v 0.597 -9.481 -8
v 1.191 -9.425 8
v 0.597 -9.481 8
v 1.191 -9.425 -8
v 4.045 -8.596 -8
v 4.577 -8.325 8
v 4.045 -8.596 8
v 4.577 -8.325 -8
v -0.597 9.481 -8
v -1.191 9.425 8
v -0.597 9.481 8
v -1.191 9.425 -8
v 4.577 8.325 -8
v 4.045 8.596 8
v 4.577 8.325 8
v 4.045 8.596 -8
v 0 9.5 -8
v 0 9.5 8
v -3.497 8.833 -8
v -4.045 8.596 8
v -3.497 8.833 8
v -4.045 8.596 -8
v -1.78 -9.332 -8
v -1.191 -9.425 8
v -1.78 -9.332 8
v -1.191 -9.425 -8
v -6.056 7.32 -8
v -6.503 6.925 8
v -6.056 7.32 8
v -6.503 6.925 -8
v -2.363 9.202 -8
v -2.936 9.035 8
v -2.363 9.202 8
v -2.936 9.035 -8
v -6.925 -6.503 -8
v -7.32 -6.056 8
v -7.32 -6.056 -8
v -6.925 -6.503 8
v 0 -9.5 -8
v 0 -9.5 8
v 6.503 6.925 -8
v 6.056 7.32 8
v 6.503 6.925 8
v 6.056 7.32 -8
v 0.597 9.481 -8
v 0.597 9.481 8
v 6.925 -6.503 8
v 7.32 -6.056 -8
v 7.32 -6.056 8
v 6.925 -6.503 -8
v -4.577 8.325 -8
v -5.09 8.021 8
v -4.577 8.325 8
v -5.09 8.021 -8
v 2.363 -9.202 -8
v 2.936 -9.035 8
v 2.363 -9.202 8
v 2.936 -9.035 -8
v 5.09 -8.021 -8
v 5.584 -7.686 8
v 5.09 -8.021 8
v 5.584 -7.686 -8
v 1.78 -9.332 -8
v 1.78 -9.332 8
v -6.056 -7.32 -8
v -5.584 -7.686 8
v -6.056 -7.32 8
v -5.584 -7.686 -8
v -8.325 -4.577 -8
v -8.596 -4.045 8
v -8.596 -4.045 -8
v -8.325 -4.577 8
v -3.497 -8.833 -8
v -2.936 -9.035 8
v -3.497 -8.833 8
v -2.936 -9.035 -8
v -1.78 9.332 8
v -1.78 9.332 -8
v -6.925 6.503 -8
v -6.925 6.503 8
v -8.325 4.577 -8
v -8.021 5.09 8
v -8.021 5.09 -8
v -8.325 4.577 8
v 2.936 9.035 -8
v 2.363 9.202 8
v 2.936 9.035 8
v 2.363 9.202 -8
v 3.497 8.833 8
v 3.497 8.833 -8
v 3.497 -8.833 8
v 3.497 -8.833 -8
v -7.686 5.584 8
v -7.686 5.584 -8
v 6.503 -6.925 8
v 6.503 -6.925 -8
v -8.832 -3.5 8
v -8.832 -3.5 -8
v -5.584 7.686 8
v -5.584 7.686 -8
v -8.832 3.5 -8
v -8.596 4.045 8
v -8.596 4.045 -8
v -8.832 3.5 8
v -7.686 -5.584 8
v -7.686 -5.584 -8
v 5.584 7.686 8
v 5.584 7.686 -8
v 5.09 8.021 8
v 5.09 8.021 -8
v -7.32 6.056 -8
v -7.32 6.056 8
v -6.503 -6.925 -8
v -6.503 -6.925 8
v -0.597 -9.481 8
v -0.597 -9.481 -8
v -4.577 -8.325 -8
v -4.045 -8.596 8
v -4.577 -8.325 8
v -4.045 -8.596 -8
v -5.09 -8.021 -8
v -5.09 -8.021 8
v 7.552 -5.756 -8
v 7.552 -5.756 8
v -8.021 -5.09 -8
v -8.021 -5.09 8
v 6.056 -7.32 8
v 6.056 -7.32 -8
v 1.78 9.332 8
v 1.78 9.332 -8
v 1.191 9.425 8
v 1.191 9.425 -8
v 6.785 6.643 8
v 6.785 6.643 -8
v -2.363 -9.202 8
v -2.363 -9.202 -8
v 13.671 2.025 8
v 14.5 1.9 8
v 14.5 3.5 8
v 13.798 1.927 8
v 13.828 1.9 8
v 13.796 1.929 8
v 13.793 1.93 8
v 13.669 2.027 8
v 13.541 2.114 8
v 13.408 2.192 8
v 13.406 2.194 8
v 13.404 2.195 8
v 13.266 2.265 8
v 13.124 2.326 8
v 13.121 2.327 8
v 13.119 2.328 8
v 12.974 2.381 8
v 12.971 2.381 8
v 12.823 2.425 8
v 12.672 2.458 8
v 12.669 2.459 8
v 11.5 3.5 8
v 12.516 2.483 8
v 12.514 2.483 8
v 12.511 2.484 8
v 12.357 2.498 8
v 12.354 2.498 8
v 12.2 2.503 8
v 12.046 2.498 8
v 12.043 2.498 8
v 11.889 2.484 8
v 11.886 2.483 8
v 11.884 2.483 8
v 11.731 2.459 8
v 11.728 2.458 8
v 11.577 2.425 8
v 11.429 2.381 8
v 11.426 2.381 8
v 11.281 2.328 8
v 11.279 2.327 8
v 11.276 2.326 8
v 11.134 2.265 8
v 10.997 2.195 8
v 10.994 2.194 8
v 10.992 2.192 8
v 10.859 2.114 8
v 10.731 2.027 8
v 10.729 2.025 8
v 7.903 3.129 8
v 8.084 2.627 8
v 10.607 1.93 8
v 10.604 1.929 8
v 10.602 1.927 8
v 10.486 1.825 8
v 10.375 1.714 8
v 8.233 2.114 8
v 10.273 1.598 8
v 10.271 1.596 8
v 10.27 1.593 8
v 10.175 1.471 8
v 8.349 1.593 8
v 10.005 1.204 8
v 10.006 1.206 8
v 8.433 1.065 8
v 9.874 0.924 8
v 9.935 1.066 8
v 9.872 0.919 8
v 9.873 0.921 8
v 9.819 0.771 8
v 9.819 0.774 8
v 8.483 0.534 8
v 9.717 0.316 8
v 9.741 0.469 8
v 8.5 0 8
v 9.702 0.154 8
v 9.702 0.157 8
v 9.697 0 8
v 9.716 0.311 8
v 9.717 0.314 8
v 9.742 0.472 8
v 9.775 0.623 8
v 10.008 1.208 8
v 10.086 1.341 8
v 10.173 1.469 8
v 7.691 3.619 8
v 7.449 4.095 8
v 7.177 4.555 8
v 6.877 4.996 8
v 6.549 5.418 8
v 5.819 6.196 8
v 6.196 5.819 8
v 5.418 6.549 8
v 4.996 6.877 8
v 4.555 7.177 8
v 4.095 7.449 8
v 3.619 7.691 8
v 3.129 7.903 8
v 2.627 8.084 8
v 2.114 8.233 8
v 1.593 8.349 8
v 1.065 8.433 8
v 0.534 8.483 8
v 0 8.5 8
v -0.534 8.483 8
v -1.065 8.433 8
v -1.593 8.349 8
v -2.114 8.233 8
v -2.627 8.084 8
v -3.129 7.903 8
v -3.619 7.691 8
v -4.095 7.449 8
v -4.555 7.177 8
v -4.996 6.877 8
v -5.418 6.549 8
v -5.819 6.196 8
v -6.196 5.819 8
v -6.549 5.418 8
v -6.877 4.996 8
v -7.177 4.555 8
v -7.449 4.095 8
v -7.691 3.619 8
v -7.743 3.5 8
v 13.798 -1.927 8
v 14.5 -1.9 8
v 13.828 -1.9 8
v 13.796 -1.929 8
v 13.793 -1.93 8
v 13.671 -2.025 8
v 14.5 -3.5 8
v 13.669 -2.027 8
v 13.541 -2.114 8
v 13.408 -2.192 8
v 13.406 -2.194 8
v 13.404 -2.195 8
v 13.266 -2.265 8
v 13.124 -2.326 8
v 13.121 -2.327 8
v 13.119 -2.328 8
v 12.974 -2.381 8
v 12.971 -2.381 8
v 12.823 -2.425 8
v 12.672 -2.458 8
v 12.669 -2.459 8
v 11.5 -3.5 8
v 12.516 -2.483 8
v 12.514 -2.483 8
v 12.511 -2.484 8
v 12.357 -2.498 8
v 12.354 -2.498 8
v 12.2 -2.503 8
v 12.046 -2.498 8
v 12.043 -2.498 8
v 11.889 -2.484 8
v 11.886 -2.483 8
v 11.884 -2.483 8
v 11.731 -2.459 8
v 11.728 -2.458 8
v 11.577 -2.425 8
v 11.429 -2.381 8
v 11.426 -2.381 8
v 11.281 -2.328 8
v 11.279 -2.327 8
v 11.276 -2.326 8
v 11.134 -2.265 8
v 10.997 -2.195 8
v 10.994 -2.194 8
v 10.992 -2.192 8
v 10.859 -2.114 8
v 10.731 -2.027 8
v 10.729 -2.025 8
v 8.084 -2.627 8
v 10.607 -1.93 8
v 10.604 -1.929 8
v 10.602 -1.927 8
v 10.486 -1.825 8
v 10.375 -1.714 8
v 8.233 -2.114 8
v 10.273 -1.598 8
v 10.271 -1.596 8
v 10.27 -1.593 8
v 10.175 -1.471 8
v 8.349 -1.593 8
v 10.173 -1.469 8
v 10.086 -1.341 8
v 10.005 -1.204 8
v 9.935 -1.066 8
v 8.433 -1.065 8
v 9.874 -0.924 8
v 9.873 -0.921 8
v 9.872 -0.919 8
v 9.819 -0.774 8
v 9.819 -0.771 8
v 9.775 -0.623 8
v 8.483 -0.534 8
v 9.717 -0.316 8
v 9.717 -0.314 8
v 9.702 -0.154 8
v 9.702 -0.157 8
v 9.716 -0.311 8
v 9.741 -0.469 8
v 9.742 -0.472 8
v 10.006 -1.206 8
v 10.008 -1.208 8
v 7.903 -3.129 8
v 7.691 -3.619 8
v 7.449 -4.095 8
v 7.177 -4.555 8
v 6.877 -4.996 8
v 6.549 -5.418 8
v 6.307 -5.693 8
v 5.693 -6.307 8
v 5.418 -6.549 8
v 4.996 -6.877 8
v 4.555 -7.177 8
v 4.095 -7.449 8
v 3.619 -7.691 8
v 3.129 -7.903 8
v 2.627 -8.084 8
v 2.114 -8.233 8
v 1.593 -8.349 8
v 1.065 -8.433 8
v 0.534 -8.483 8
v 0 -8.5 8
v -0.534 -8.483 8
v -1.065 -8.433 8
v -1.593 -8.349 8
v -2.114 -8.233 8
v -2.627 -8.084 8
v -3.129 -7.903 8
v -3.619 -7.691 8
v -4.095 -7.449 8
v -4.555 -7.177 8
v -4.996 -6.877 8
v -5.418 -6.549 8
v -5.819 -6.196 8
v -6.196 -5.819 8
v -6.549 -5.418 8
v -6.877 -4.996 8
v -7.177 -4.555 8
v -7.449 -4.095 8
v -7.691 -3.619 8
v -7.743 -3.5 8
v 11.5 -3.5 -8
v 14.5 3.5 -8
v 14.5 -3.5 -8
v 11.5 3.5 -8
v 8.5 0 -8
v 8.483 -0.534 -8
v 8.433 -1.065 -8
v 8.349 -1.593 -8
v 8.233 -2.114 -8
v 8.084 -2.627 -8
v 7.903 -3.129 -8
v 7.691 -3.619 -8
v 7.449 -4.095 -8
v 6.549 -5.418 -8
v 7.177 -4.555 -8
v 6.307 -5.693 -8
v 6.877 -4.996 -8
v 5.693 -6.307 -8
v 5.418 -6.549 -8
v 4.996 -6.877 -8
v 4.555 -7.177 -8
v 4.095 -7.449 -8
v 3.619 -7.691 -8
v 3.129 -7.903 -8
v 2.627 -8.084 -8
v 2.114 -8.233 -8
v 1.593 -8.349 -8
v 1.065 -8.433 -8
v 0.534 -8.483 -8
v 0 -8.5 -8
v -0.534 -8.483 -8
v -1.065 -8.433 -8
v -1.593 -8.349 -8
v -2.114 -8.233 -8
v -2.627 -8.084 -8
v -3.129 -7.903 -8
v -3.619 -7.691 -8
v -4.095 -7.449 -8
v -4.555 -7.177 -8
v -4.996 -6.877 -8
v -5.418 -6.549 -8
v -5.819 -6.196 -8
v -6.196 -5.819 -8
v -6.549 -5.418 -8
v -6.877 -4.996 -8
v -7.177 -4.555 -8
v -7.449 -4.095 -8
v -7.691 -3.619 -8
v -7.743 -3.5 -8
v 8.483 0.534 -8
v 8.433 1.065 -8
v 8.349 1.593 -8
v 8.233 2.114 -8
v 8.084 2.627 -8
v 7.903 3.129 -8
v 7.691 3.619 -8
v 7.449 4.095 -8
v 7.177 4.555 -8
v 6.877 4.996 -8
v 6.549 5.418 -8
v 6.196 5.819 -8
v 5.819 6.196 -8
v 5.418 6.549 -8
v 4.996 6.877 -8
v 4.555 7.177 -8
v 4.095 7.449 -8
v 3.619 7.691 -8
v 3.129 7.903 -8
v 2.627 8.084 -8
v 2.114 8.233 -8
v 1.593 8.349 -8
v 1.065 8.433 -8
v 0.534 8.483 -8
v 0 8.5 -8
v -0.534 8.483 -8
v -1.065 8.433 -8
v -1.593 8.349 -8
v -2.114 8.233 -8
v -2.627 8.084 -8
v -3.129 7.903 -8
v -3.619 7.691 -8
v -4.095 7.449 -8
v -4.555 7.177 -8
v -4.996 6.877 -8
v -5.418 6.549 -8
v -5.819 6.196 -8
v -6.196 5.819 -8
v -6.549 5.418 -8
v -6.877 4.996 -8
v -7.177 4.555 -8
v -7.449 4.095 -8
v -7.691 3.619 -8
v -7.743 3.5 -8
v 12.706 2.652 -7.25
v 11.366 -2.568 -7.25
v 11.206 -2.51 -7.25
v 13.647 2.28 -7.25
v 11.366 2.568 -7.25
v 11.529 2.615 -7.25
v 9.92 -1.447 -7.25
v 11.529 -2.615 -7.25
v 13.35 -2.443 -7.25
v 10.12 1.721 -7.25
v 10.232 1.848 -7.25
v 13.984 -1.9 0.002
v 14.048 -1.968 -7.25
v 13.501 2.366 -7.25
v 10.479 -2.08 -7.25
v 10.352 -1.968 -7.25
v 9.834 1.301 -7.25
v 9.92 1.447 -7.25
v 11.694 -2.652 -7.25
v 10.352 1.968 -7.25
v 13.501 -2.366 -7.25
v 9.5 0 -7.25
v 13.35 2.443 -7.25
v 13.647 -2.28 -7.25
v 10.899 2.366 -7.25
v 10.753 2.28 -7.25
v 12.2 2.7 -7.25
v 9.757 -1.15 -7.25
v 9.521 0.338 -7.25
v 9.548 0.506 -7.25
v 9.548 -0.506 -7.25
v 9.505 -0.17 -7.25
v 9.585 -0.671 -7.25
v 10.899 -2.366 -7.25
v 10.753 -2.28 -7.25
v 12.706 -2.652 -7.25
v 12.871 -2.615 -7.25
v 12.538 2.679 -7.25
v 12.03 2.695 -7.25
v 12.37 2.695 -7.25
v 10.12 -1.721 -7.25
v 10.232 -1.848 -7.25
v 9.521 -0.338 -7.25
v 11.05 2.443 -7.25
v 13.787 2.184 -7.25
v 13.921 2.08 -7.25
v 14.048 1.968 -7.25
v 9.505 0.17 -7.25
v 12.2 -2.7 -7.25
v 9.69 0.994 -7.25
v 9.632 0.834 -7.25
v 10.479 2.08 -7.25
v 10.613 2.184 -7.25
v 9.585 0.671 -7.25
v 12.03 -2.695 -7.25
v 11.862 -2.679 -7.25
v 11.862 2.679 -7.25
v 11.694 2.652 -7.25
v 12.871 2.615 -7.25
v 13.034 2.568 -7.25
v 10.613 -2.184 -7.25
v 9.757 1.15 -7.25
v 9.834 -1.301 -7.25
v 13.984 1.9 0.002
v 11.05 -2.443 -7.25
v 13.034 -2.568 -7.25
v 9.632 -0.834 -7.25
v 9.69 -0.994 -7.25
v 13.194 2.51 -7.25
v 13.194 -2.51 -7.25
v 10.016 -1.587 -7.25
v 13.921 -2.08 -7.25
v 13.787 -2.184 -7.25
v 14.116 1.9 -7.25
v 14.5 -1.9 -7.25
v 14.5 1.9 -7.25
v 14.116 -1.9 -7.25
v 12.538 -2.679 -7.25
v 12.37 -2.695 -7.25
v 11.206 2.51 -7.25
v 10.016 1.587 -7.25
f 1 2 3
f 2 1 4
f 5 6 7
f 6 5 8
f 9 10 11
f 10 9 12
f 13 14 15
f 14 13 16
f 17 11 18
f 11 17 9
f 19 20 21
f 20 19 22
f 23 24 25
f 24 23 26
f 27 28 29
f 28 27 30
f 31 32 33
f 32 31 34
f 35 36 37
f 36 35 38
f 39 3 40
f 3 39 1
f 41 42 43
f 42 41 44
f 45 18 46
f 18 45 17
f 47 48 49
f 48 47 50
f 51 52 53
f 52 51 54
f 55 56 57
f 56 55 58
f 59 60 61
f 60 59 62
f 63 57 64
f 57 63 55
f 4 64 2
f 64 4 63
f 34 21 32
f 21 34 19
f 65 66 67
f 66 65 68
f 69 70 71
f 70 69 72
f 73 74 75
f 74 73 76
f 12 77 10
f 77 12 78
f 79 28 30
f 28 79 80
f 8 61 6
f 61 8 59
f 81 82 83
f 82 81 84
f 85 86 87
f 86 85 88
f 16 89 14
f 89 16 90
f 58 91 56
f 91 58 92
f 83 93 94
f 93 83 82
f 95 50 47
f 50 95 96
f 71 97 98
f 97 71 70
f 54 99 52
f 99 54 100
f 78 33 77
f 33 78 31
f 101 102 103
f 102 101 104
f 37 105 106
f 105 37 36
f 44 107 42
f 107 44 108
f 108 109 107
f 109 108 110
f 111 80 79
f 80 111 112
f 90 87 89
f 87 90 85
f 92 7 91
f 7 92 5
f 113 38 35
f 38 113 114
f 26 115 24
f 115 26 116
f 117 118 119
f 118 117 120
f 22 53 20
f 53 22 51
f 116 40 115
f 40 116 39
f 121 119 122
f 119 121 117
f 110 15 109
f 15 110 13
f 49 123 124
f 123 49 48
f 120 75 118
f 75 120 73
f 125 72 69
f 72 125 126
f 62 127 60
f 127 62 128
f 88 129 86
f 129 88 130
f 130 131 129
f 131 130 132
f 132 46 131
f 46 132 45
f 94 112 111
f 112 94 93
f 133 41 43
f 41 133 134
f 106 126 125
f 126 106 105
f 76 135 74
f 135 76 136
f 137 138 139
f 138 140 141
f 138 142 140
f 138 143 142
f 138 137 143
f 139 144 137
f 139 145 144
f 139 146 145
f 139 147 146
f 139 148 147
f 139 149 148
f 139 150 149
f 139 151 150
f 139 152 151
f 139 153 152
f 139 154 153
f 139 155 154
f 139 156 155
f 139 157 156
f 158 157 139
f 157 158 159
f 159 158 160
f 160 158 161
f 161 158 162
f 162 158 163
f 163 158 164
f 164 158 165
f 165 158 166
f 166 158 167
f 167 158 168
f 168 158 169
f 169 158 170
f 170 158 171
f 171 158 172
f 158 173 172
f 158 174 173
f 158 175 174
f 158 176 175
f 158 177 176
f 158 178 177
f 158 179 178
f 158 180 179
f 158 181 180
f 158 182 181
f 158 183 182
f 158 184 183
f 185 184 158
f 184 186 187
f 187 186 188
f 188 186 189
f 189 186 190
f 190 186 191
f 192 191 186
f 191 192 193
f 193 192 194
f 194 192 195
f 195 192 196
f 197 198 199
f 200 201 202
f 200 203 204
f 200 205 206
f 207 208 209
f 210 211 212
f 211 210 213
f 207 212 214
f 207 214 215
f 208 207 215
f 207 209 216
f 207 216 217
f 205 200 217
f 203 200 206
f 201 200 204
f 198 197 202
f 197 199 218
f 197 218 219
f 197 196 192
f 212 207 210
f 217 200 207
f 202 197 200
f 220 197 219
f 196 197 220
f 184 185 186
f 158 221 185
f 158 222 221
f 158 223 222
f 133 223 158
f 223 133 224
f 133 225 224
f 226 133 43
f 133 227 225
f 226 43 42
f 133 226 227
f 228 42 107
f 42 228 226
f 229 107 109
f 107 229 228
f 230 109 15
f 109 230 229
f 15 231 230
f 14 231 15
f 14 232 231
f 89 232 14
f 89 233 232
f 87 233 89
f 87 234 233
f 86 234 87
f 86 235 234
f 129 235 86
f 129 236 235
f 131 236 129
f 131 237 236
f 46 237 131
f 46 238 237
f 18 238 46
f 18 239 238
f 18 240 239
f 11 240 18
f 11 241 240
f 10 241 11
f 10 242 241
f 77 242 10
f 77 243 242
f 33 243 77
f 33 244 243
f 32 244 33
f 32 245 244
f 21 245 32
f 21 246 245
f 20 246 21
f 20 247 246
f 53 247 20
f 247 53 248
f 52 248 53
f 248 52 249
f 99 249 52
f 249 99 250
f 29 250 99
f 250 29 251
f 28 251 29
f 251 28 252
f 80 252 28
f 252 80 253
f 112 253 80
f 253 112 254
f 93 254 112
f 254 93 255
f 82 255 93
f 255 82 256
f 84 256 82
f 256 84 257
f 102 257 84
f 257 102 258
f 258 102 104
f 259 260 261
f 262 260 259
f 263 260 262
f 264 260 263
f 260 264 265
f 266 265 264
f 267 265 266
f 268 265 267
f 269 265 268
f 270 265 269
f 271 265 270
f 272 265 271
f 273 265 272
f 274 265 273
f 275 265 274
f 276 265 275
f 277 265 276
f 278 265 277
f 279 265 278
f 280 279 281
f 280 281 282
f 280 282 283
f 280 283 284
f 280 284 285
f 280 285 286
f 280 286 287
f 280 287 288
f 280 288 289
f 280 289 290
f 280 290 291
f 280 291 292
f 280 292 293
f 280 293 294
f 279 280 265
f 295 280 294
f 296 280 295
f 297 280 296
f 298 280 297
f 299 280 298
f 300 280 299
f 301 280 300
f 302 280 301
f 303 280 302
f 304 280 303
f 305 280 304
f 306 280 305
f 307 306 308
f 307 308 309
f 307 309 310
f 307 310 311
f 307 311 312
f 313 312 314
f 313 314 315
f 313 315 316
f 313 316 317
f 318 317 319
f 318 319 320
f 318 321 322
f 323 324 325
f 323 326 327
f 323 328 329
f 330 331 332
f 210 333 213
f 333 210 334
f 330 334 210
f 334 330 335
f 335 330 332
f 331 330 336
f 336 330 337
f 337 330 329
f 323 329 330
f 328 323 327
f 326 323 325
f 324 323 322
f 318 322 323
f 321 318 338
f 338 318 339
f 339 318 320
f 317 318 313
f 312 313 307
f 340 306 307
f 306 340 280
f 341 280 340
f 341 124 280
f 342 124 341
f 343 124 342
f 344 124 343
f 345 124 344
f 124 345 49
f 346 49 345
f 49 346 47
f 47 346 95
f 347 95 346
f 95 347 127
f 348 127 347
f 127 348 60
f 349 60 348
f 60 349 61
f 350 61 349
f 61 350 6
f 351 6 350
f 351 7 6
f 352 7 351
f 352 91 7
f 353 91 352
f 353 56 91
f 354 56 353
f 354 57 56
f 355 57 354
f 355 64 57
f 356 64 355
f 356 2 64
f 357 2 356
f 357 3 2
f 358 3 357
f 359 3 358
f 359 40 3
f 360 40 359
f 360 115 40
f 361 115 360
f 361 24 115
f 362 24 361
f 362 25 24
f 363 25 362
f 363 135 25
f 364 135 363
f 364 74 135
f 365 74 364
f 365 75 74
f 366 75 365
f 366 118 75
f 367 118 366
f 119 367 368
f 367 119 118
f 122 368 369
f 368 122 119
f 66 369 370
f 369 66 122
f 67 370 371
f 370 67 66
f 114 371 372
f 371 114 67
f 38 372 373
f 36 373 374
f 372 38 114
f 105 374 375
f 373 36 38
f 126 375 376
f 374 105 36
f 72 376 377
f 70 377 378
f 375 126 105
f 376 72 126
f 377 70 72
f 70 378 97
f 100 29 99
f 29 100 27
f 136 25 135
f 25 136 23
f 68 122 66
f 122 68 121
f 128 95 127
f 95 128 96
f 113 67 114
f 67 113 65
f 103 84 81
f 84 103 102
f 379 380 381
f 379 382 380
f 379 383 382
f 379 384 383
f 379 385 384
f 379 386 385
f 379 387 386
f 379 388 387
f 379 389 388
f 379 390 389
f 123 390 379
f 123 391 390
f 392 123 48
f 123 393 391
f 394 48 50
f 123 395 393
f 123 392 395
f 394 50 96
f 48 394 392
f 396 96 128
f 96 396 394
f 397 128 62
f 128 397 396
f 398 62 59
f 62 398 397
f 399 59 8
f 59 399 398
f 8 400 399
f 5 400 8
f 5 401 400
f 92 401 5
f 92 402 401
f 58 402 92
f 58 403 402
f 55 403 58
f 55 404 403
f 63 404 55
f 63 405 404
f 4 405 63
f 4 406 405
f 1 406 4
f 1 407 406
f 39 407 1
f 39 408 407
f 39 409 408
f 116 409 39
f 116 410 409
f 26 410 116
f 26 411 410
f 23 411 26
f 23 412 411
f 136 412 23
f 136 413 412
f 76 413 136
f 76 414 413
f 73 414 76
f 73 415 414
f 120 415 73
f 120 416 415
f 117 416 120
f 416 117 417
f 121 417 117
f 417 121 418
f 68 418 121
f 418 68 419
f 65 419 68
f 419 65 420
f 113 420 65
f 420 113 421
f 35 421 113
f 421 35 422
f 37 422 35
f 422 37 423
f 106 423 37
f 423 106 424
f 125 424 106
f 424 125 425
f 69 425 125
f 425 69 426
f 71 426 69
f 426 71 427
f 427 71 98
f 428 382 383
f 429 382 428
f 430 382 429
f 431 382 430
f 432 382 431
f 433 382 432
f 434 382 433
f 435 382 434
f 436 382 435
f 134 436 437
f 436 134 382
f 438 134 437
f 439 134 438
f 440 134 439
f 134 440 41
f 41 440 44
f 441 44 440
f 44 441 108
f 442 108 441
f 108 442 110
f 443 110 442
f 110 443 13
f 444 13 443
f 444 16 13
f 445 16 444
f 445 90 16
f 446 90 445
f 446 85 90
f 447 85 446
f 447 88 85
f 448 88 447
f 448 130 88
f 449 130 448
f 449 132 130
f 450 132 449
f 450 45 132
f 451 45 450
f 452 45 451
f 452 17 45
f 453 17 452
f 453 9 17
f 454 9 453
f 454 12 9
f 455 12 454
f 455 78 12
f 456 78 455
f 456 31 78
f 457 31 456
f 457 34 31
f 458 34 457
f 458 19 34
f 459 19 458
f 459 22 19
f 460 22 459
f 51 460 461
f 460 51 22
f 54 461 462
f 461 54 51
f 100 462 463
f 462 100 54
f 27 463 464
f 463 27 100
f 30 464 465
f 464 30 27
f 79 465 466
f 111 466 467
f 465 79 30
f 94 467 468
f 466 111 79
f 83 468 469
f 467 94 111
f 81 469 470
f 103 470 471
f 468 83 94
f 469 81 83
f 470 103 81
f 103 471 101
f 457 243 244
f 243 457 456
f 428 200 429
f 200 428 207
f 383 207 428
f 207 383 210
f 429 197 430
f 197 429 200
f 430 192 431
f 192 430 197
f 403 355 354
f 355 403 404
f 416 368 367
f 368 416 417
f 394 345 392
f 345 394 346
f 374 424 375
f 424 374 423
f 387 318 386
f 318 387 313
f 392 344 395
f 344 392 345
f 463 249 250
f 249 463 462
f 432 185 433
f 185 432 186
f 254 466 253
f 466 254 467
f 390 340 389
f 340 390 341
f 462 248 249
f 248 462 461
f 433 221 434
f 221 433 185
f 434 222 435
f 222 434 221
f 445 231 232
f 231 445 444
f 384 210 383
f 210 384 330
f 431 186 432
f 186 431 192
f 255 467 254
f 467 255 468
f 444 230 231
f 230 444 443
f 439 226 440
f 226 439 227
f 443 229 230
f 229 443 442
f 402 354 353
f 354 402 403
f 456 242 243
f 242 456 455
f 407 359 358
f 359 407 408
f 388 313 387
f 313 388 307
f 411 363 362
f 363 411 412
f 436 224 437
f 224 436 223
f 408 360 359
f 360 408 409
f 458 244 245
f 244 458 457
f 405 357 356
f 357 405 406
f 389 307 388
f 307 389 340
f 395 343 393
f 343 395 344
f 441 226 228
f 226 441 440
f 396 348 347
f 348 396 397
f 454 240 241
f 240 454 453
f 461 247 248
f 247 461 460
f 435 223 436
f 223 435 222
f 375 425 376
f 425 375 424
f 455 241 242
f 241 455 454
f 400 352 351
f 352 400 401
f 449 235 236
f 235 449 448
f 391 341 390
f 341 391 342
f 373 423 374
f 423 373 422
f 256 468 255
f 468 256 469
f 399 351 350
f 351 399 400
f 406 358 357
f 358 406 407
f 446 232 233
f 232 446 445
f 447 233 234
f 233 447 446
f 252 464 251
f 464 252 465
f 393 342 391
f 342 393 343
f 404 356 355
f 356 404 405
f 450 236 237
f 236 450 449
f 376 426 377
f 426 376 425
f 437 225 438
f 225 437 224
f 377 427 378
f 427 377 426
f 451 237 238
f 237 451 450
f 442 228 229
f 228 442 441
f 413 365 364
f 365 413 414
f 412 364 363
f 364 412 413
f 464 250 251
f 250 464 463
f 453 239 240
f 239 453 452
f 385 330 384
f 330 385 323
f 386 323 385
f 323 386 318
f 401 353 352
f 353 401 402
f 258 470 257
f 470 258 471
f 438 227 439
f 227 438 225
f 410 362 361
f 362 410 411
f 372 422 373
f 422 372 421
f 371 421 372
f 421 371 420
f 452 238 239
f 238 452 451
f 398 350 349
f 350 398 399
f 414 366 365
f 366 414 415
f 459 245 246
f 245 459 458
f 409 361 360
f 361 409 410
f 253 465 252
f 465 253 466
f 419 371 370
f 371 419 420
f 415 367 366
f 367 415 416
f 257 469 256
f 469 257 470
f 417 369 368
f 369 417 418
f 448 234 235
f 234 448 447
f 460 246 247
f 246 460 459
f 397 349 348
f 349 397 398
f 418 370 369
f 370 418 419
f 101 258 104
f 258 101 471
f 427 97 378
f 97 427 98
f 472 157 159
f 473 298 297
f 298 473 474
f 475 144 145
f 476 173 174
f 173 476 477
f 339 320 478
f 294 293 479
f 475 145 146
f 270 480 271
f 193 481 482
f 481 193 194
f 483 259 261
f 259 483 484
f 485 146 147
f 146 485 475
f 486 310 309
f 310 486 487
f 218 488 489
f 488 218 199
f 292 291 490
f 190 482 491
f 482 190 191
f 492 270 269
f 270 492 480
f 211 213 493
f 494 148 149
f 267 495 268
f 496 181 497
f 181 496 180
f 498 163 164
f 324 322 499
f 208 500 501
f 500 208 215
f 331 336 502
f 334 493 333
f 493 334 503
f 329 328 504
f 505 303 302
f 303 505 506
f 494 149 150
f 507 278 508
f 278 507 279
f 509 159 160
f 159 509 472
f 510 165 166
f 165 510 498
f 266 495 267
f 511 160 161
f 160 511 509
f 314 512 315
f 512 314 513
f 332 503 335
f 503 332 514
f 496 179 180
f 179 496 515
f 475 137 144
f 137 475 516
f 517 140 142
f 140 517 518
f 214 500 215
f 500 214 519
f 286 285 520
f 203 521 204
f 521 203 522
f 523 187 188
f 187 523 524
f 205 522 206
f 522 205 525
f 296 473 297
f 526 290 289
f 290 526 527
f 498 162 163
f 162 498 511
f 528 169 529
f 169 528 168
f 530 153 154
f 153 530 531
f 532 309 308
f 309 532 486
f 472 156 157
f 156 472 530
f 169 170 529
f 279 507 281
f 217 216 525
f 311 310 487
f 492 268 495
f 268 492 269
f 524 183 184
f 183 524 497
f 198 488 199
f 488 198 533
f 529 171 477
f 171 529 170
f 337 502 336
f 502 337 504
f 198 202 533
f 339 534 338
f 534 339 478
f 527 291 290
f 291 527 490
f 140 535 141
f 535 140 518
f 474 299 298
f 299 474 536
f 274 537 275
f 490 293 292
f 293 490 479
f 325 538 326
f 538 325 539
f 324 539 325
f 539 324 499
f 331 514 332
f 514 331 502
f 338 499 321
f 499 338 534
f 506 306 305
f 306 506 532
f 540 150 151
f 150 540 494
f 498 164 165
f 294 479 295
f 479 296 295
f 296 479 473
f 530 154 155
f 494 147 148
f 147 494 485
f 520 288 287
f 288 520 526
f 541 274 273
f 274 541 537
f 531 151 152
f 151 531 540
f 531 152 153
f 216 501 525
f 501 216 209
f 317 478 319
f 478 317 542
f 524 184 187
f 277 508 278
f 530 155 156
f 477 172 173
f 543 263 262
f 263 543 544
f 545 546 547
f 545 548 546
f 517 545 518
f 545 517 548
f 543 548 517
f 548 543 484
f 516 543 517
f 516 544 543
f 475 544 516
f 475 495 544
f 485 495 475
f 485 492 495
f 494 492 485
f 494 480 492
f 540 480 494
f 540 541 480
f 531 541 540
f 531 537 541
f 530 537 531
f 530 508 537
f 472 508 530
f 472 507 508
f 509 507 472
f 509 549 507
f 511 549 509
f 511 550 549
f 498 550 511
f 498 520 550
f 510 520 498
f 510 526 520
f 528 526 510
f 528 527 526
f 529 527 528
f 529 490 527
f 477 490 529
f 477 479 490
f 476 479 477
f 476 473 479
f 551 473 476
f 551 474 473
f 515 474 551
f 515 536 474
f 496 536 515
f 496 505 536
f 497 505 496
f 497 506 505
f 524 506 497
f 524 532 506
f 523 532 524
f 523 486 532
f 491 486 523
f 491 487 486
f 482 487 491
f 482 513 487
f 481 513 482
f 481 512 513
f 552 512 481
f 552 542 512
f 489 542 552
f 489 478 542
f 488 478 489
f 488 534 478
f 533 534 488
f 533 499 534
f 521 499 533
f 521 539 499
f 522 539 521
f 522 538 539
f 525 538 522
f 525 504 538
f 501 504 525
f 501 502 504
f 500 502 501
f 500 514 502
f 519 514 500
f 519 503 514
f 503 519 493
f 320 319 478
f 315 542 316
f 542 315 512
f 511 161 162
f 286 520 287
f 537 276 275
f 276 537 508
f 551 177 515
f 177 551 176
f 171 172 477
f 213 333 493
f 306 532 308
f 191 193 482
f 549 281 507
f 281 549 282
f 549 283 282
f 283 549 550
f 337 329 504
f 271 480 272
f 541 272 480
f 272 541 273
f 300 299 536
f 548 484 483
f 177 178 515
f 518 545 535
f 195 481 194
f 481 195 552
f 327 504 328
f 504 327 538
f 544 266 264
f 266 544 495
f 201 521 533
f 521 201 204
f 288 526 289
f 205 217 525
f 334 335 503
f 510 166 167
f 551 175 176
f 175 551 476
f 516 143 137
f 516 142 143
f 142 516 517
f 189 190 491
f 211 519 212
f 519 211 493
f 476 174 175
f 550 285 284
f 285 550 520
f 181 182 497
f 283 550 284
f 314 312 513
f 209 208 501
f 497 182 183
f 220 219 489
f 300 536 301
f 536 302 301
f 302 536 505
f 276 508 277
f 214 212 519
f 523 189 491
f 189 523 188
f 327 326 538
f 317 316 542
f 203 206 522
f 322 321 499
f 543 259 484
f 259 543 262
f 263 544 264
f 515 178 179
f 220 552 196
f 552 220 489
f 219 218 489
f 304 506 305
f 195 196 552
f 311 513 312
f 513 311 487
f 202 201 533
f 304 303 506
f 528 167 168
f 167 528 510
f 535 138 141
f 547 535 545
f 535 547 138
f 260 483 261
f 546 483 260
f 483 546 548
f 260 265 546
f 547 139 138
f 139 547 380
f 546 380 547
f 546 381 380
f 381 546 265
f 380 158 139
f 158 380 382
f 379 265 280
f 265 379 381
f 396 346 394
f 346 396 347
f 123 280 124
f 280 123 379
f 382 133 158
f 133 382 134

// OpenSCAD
$fn=100;
module ring(heigth,radius){
	// the ring itself
	radius = radius+1;
	difference(){
		cylinder(h=heigth,r=radius+1,center=true);
		cylinder(h=heigth+1,r=radius,center=true);
		// the hole...
   		rotate([0,0,0]) translate([-radius,0,0]) cube([3,7,heigth+2],center=true);
	}

	// the magnet holder
	rMag = 2.5;
	translate([radius+rMag+0.5,0,0])
	difference(){
		cube([rMag*2+1,rMag*2+2,heigth],center=true);
		translate([0.7,0,0.5]) 
		union(){						
			cylinder(h=heigth-0.5,r1=rMag+0.2,r2=rMag,center=true);	//inner cylinder
			translate([rMag,0,0]) cube([3,3.8,heigth-0.5],center=true);	//upper hole
		}
	}
	// the connection/stabilization thing
	// for radius = 7.5
	translate([radius,-(rMag*2+2)/2,0])		
	linear_extrude(height = heigth, center = true, convexity = 10, twist = 0)
	polygon(points=[[0,0],[-4,-4],[(rMag*2+1)/2,0]], paths=[[0,1,2]]);
	mirror([0,1,0])
	translate([radius,-(rMag*2+2)/2,0])
	linear_extrude(height = heigth, center = true, convexity = 10, twist = 0)
	polygon(points=[[0,0],[-3,-4],[(rMag*2+1)/2,0]], paths=[[0,1,2]]);
}


/* radi for (my)fingers:
	index: 7.5
	middle: 8 
	ring: 7.5
	pinky: 6

	wooden hand:
	index: 7.5
	middle: 7.5 
	ring: 7.5
	pinky: 7	


	dimensions of magnet: 
	radius = 2.5
	length = 15
*/
ring(16,7.5);
//translate([0,0,20])
//cylinder(h=16-0.5,r1=2.5+0.2,r2=2.5-0.1,center=true);
